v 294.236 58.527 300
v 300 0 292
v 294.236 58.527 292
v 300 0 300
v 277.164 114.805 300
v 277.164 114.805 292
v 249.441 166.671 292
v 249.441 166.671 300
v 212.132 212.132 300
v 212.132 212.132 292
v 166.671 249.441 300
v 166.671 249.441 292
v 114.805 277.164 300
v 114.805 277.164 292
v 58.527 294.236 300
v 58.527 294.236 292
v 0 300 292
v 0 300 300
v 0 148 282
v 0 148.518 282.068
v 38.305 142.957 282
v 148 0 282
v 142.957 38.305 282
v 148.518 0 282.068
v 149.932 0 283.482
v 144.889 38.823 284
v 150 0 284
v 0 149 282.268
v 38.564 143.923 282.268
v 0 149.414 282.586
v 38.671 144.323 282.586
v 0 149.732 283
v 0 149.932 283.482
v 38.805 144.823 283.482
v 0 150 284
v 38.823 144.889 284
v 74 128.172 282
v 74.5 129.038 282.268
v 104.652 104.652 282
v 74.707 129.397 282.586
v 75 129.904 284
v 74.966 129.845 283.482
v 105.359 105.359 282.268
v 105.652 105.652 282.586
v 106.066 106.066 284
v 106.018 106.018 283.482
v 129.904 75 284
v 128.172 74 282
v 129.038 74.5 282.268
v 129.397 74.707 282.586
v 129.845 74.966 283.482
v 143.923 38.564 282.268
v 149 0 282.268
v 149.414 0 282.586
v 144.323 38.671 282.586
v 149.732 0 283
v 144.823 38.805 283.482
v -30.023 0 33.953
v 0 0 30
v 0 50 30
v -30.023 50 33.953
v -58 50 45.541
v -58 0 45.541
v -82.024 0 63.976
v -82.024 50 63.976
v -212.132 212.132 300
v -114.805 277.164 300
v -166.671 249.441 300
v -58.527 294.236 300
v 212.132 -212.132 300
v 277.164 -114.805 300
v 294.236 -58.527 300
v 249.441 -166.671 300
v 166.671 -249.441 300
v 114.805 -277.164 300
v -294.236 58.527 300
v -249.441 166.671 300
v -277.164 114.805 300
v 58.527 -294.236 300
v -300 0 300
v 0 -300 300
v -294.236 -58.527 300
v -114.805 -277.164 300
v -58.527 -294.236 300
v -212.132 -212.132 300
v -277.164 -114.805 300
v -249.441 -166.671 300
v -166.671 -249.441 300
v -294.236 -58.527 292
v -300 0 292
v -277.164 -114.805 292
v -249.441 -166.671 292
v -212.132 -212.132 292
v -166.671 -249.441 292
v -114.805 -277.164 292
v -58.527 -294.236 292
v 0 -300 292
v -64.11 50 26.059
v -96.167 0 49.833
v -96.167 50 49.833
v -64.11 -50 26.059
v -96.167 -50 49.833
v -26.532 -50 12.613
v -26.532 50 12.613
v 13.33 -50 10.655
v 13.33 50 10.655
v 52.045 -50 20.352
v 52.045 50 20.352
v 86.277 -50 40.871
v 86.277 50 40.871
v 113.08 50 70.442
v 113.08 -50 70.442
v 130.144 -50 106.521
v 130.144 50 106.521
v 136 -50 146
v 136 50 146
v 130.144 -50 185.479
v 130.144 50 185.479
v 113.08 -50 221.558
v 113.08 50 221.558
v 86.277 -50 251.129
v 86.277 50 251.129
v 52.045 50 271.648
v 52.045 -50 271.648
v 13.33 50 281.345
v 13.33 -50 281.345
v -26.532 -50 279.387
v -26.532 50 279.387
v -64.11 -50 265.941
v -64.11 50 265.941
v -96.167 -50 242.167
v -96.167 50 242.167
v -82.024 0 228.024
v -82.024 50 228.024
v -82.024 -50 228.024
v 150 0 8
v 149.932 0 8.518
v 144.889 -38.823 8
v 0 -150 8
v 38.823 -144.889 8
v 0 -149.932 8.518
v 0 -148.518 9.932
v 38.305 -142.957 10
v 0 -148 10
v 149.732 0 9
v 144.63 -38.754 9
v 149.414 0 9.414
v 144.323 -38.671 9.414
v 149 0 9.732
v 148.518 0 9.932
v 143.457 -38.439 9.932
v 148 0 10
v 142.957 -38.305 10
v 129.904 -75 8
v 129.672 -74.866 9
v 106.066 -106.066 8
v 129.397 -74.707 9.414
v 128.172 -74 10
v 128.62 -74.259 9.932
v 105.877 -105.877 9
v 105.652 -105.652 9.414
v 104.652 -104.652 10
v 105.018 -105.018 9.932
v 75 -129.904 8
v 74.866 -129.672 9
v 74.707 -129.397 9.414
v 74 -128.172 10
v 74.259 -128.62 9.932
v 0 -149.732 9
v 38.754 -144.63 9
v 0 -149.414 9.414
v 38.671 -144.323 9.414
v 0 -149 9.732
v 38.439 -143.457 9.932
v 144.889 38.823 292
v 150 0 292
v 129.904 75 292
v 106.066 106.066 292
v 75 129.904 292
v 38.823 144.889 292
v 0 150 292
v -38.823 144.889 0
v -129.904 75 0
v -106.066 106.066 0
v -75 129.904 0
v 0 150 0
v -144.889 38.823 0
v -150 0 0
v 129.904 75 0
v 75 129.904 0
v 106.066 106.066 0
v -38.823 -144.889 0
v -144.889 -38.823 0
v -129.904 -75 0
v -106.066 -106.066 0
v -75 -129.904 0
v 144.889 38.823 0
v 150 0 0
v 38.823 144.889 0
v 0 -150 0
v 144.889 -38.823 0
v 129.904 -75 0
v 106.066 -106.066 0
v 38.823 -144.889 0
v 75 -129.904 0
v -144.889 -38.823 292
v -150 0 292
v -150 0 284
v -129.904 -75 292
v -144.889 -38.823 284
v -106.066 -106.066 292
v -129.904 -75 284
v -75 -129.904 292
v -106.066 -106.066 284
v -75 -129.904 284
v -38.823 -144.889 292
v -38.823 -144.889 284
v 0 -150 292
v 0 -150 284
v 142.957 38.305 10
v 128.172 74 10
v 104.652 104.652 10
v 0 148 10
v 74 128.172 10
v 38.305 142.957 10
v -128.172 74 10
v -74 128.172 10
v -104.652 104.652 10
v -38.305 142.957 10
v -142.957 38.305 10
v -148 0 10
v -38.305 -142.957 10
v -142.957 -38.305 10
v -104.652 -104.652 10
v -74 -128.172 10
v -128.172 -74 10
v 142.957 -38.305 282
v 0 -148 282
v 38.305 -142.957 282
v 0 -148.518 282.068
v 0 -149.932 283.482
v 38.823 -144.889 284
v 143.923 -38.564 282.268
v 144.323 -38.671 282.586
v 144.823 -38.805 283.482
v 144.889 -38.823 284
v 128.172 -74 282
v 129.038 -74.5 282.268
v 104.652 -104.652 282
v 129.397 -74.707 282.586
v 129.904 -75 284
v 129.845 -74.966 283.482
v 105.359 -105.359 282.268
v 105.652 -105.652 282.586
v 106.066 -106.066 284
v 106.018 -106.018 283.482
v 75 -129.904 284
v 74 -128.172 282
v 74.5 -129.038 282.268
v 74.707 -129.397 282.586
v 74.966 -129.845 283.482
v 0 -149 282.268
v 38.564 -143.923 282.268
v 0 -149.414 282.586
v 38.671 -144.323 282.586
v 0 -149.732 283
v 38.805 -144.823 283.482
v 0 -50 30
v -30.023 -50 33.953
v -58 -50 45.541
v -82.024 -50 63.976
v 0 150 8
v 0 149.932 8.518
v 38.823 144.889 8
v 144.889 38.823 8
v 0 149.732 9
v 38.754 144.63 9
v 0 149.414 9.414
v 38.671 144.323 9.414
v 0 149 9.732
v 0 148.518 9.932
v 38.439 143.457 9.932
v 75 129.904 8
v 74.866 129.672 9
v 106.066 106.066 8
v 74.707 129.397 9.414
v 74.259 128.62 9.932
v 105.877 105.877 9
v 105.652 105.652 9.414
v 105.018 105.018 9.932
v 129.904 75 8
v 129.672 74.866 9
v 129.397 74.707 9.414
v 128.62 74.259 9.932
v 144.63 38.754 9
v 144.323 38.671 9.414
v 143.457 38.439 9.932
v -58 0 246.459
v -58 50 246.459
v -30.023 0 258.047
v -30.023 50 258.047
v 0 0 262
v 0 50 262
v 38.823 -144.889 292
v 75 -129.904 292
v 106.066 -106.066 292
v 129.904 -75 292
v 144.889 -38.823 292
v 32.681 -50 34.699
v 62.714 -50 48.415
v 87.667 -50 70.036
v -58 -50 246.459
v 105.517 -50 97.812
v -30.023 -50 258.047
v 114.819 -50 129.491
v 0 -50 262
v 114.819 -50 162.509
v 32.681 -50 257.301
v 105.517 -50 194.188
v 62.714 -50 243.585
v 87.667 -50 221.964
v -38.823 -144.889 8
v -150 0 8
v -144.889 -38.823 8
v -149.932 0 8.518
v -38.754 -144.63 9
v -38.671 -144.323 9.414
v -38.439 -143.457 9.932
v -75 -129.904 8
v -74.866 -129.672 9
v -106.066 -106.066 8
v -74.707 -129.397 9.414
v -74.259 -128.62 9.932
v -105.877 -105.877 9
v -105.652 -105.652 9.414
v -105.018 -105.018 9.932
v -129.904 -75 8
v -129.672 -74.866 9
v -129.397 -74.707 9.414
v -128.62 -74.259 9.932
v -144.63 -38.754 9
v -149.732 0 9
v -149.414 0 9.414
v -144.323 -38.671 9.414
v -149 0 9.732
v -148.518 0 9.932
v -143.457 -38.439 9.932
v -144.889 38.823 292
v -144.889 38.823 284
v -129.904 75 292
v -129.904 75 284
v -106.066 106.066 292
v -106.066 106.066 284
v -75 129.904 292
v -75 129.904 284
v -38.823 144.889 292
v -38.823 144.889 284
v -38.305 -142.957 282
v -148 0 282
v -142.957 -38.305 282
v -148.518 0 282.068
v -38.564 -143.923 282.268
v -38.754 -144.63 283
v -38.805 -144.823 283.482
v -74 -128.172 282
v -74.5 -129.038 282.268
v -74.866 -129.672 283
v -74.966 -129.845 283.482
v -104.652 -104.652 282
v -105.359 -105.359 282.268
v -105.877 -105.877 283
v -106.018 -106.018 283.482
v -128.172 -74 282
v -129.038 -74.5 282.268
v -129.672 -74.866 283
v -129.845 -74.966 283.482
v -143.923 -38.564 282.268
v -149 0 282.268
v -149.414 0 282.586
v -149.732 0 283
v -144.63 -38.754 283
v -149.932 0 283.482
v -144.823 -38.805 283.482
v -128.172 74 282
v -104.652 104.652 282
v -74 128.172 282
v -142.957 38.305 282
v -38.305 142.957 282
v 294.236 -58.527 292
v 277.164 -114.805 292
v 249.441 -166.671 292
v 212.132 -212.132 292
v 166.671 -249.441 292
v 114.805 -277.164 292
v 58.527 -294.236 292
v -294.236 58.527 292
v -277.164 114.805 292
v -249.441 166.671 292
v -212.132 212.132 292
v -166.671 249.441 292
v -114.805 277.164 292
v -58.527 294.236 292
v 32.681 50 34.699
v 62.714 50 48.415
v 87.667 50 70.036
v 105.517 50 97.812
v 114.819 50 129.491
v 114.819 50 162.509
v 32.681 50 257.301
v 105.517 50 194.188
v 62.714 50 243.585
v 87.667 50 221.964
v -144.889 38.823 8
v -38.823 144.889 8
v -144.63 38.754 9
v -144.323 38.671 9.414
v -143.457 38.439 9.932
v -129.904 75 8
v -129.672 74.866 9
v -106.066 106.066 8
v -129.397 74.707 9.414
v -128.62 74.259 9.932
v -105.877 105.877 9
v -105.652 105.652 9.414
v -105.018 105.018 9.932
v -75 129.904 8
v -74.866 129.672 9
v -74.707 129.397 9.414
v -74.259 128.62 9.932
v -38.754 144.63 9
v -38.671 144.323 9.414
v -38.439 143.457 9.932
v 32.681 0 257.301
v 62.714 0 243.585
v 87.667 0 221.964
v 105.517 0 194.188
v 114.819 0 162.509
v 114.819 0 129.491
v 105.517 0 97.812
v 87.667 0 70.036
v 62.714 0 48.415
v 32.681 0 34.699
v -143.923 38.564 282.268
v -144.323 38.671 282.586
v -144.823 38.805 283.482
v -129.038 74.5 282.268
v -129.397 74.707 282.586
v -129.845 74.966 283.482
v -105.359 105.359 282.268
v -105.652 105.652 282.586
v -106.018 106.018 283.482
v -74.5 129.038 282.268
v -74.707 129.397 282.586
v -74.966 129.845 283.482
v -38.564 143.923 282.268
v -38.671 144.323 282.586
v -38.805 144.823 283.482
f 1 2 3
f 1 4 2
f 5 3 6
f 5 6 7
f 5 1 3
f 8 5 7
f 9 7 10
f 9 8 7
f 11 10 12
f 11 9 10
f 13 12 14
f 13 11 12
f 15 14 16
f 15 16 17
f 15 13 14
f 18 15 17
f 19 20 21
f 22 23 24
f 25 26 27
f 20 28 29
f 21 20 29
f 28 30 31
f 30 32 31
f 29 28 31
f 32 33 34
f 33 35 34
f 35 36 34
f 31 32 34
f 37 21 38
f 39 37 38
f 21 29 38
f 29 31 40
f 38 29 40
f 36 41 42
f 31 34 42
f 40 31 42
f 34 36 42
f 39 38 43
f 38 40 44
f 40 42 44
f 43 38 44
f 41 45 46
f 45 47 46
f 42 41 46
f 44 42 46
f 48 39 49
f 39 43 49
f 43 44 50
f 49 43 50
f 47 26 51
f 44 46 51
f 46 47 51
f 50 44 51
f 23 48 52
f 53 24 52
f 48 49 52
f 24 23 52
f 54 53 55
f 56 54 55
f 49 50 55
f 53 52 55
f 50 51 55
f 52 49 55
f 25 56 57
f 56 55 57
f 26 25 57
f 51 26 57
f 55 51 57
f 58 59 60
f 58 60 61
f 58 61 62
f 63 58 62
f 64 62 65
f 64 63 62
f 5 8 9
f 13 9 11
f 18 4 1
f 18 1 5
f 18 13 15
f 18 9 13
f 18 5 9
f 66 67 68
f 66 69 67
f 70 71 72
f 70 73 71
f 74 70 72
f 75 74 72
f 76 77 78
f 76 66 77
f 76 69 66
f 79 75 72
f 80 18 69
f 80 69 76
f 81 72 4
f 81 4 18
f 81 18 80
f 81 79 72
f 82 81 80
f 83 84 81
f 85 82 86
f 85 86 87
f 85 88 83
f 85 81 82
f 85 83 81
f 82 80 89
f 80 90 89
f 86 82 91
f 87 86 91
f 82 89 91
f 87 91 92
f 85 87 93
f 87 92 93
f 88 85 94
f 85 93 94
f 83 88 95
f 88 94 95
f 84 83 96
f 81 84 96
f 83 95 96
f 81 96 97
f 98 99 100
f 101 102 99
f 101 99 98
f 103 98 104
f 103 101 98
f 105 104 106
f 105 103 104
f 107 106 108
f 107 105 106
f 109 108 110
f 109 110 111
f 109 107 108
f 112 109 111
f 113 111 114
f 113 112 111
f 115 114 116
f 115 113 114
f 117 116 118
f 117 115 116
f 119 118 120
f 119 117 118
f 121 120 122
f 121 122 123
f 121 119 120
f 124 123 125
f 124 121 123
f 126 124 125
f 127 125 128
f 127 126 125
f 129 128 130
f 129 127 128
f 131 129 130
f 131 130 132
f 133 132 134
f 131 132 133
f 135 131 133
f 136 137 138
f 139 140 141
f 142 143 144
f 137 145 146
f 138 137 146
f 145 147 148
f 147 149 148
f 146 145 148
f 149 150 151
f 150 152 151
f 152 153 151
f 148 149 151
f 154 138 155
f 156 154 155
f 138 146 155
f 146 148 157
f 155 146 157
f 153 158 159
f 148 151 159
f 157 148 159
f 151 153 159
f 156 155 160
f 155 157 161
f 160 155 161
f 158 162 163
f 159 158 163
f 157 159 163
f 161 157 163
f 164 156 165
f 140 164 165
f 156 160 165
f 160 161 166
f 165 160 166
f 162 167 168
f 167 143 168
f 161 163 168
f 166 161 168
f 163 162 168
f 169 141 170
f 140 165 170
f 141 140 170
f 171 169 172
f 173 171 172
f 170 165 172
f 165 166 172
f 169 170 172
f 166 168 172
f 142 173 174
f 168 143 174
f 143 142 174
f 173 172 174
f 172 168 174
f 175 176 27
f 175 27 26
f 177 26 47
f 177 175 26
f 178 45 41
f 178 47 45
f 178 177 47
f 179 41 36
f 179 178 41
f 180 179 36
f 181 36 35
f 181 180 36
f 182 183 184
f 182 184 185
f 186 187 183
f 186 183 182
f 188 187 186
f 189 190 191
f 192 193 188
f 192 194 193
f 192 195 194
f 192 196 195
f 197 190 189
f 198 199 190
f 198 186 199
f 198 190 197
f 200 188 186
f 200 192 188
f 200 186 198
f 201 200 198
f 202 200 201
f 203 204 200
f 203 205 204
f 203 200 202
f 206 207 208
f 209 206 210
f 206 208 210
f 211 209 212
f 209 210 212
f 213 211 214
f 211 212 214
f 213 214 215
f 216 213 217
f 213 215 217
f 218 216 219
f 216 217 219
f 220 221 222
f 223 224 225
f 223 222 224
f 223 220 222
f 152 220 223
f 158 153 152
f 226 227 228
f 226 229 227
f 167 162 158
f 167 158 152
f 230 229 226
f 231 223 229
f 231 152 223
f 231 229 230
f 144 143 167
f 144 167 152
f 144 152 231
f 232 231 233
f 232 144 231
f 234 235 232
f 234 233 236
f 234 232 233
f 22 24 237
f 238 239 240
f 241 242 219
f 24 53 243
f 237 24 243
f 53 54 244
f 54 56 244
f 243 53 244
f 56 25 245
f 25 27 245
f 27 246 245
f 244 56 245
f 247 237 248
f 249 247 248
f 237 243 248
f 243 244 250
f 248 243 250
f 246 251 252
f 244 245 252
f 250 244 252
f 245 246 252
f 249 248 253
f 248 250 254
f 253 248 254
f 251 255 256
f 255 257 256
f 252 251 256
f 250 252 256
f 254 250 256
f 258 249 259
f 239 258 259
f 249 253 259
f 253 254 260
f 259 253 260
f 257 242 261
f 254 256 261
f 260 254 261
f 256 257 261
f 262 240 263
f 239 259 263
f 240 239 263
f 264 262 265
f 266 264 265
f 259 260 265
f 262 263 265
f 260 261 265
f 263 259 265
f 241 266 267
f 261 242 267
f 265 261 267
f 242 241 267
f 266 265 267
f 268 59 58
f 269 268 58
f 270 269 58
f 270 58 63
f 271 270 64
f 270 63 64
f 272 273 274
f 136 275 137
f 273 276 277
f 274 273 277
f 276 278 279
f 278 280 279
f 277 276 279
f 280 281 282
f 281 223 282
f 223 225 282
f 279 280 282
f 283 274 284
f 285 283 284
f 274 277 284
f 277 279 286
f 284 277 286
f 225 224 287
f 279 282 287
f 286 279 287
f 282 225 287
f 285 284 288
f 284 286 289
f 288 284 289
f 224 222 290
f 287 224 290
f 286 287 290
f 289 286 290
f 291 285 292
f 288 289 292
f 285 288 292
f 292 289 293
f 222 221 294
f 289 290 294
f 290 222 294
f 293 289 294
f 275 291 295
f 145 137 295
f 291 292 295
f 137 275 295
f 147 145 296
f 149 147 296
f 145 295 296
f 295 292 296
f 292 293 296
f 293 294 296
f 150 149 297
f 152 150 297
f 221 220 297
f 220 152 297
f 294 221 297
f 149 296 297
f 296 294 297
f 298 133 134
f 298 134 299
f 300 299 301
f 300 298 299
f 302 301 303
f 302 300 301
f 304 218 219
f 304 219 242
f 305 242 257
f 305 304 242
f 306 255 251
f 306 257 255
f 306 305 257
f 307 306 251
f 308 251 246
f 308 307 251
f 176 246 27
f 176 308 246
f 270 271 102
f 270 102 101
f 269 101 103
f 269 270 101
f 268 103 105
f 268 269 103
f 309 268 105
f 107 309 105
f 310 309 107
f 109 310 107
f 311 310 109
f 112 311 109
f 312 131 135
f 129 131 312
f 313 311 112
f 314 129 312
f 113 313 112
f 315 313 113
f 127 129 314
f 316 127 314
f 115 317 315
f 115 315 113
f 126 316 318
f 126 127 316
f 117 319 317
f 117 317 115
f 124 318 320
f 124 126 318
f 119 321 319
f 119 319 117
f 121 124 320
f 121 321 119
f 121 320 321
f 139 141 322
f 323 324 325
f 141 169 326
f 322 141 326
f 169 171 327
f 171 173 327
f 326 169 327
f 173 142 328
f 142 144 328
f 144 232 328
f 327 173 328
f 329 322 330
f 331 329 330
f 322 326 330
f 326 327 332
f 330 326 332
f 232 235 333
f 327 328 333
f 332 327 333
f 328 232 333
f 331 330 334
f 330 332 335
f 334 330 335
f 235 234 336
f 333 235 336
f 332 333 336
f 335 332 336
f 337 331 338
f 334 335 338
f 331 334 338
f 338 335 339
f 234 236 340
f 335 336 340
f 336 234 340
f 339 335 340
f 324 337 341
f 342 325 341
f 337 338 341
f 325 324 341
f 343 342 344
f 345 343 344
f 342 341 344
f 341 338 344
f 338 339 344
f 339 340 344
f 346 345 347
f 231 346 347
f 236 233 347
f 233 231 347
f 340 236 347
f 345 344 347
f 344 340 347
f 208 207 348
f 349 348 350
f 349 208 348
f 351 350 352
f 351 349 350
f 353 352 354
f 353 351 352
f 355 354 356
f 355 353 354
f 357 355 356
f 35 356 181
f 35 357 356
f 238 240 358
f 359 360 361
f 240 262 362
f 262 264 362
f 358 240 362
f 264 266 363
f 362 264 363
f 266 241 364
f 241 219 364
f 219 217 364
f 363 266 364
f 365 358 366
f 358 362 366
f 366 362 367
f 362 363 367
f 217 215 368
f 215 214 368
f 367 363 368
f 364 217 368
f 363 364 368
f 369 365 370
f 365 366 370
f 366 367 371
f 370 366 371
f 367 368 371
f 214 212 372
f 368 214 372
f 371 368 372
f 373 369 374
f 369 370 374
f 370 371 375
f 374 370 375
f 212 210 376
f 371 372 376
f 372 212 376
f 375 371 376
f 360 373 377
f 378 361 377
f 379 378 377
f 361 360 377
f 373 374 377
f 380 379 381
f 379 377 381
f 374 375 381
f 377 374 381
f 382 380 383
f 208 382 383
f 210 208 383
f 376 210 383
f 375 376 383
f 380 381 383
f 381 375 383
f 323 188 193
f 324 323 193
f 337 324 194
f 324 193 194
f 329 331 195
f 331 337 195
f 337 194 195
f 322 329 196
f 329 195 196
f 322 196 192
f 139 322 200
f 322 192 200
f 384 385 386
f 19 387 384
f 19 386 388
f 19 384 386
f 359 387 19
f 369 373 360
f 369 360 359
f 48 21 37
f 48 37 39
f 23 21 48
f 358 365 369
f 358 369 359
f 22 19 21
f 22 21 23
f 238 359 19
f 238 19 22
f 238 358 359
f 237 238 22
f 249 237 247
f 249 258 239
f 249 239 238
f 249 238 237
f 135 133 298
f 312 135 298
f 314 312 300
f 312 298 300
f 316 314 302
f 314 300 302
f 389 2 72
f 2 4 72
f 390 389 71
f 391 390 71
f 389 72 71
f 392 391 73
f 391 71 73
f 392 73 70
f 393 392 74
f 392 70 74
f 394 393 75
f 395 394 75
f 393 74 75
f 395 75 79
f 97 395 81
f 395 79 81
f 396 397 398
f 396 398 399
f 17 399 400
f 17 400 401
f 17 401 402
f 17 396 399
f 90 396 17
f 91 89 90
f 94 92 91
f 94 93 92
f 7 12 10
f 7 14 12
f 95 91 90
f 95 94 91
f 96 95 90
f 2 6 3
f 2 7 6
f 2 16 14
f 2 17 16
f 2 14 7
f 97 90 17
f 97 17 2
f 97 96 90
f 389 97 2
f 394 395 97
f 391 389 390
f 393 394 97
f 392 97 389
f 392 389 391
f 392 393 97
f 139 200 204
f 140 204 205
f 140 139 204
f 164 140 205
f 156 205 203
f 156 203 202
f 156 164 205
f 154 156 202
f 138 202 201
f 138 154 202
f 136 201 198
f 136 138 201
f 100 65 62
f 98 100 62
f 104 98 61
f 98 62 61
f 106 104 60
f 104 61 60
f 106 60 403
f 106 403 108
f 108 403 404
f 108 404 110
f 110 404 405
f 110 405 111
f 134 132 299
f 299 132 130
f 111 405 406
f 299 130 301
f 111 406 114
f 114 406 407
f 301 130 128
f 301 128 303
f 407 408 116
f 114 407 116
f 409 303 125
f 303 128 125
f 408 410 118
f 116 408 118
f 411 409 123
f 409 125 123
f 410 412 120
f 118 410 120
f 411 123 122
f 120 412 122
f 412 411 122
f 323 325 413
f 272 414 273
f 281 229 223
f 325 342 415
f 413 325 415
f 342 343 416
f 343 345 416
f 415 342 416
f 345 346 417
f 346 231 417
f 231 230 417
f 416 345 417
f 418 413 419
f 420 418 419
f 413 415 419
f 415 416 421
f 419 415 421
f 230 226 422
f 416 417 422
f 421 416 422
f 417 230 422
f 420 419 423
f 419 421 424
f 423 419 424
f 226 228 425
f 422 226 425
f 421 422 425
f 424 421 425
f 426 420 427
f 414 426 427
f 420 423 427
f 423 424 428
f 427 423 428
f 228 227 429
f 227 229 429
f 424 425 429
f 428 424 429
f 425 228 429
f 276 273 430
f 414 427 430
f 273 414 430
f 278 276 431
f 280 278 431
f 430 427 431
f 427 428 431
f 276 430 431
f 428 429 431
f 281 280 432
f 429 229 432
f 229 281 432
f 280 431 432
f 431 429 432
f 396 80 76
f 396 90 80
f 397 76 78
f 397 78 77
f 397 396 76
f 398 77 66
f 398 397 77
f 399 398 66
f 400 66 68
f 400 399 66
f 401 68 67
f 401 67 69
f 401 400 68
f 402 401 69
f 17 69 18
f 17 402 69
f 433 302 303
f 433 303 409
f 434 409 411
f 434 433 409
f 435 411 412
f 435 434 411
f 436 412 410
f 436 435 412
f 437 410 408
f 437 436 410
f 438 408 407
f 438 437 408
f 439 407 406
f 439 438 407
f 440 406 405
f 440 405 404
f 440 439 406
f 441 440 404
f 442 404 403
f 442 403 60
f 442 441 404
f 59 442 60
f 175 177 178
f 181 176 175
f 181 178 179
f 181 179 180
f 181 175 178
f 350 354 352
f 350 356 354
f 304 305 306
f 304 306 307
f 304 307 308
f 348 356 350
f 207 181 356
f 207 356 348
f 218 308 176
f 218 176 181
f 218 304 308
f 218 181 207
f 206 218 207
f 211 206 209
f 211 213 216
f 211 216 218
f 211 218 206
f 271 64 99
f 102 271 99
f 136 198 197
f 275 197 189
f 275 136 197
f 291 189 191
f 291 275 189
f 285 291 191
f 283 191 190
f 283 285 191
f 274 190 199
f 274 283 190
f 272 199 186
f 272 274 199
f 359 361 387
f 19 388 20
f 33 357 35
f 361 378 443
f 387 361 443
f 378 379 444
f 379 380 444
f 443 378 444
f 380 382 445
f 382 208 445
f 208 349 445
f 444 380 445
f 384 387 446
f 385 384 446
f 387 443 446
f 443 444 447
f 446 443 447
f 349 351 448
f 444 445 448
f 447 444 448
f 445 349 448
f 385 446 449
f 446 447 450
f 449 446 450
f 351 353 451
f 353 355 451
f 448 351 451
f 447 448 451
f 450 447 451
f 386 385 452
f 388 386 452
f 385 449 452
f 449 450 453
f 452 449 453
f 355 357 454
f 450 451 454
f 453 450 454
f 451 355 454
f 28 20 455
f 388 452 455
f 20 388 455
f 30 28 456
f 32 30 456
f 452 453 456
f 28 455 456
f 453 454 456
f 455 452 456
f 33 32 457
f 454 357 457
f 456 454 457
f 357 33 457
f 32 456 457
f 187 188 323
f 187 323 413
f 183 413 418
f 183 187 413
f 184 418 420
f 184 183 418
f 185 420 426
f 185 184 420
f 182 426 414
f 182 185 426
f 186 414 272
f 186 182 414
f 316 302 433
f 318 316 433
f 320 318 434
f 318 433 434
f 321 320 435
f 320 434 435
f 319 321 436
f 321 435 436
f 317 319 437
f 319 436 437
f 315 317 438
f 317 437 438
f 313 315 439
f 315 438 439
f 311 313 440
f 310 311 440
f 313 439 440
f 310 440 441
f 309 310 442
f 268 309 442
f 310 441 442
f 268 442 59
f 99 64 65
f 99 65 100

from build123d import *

# Parameters (mm, degrees)
F1_DEPTH      = 300
F1_DEPTH_BACK = 300
F2_DEPTH      = 150
F2_DEPTH_BACK = 150
F3_DEPTH      = 50
F3_DEPTH_BACK = 50
F4_R          = 299.99999
F5_R          = 149.99999
F5_2_R        = 149.99999
F6_R          = 2
F6_2_R        = 2


# Not quite as in the source:
# - a fillet or chamfer is up to 0.001 mm smaller than in the source, because OpenCascade refuses the exact size


with BuildPart() as f1:
    # F0 (on Front) → F1 (new body, two sides)
    with BuildSketch(Plane.XZ) as f1_sk:
        Polygon((-150, 292), (150, 292), (300, 292), (300, 300), (-300, 300), (-300, 292), align=None)
    extrude(amount=F1_DEPTH)
    extrude(f1_sk.sketch, amount=-F1_DEPTH_BACK)

    # F4 (radius 300 in the source; OpenCascade refuses exactly that, so slightly less here)
    f4_edges = [f1.edges().sort_by_distance(p)[0] for p in [
        (-300, 300, 296),
        (-300, -300, 296),
        (300, 300, 296),
        (300, -300, 296),
    ]]
    fillet(f4_edges, radius=F4_R)


with BuildPart() as f2:
    # F0 (on Front) → F2 (new body, two sides)
    with BuildSketch(Plane.XZ) as f2_sk:
        Polygon((-150, 282), (0, 282), (150, 282), (150, 292), (-150, 292), align=None)
    extrude(amount=F2_DEPTH)
    extrude(f2_sk.sketch, amount=-F2_DEPTH_BACK)

    # F5 (radius 150 in the source; OpenCascade refuses exactly that, so slightly less here)
    f5_edges = [f2.edges().sort_by_distance(p)[0] for p in [
        (150, -150, 287),
        (150, 150, 287),
        (-150, 150, 287),
        (-150, -150, 287),
    ]]
    fillet(f5_edges, radius=F5_R)

    # F6
    f6_edges = [f2.edges().sort_by_distance(p)[0] for p in [
        (-150, 0, 282),
        (-106.06602, -106.06602, 282),
        (-106.06602, 106.06602, 282),
        (0, -150, 282),
        (0, 150, 282),
        (106.06602, -106.06602, 282),
        (106.06602, 106.06602, 282),
        (150, 0, 282),
    ]]
    fillet(f6_edges, radius=F6_R)


with BuildPart() as f2b:
    # F0 (on Front) → F2, piece 2 (new body, two sides)
    with BuildSketch(Plane.XZ) as f2_2_sk:
        Polygon((-150, 0), (0, 0), (150, 0), (150, 10), (0, 10), (-150, 10), align=None)
    extrude(amount=F2_DEPTH)
    extrude(f2_2_sk.sketch, amount=-F2_DEPTH_BACK)

    # F5#2 (radius 150 in the source; OpenCascade refuses exactly that, so slightly less here)
    f5_2_edges = [f2b.edges().sort_by_distance(p)[0] for p in [
        (150, -150, 5),
        (150, 150, 5),
        (-150, -150, 5),
        (-150, 150, 5),
    ]]
    fillet(f5_2_edges, radius=F5_2_R)

    # F6#2
    f6_2_edges = [f2b.edges().sort_by_distance(p)[0] for p in [
        (0, -150, 10),
        (-106.06602, -106.06602, 10),
        (106.06602, -106.06602, 10),
        (-150, 0, 10),
        (150, 0, 10),
        (-106.06602, 106.06602, 10),
        (106.06602, 106.06602, 10),
        (0, 150, 10),
    ]]
    fillet(f6_2_edges, radius=F6_2_R)


with BuildPart() as f3:
    # F0 (on Front) → F3 (new body, two sides)
    with BuildSketch(Plane.XZ) as f3_sk:
        with BuildLine():
            Line((0, 30), (0, 10))
            ThreePointArc((0, 10), (136, 146), (0, 282))
            Line((0, 282), (0, 262))
            ThreePointArc((0, 262), (116, 146), (0, 30))
        make_face()
        with BuildLine():
            Line((0, 262), (0, 282))
            ThreePointArc((0, 282), (-52.0449468017, 271.6476164215), (-96.1665222414, 242.1665222414))
            Line((-96.1665222414, 242.1665222414), (-82.0243866176, 228.0243866176))
            ThreePointArc((-82.0243866176, 228.0243866176), (-44.3912781544, 253.1700257713), (0, 262))
        make_face()
        with BuildLine():
            ThreePointArc((-96.1665222414, 49.8334777586), (-52.0449468017, 20.3523835785), (0, 10))
            Line((0, 10), (0, 30))
            ThreePointArc((0, 30), (-44.3912781544, 38.8299742287), (-82.0243866176, 63.9756133824))
            Line((-82.0243866176, 63.9756133824), (-96.1665222414, 49.8334777586))
        make_face()
    extrude(amount=F3_DEPTH)
    extrude(f3_sk.sketch, amount=-F3_DEPTH_BACK)


solid = Compound([f1.part, f2.part, f2b.part, f3.part])
